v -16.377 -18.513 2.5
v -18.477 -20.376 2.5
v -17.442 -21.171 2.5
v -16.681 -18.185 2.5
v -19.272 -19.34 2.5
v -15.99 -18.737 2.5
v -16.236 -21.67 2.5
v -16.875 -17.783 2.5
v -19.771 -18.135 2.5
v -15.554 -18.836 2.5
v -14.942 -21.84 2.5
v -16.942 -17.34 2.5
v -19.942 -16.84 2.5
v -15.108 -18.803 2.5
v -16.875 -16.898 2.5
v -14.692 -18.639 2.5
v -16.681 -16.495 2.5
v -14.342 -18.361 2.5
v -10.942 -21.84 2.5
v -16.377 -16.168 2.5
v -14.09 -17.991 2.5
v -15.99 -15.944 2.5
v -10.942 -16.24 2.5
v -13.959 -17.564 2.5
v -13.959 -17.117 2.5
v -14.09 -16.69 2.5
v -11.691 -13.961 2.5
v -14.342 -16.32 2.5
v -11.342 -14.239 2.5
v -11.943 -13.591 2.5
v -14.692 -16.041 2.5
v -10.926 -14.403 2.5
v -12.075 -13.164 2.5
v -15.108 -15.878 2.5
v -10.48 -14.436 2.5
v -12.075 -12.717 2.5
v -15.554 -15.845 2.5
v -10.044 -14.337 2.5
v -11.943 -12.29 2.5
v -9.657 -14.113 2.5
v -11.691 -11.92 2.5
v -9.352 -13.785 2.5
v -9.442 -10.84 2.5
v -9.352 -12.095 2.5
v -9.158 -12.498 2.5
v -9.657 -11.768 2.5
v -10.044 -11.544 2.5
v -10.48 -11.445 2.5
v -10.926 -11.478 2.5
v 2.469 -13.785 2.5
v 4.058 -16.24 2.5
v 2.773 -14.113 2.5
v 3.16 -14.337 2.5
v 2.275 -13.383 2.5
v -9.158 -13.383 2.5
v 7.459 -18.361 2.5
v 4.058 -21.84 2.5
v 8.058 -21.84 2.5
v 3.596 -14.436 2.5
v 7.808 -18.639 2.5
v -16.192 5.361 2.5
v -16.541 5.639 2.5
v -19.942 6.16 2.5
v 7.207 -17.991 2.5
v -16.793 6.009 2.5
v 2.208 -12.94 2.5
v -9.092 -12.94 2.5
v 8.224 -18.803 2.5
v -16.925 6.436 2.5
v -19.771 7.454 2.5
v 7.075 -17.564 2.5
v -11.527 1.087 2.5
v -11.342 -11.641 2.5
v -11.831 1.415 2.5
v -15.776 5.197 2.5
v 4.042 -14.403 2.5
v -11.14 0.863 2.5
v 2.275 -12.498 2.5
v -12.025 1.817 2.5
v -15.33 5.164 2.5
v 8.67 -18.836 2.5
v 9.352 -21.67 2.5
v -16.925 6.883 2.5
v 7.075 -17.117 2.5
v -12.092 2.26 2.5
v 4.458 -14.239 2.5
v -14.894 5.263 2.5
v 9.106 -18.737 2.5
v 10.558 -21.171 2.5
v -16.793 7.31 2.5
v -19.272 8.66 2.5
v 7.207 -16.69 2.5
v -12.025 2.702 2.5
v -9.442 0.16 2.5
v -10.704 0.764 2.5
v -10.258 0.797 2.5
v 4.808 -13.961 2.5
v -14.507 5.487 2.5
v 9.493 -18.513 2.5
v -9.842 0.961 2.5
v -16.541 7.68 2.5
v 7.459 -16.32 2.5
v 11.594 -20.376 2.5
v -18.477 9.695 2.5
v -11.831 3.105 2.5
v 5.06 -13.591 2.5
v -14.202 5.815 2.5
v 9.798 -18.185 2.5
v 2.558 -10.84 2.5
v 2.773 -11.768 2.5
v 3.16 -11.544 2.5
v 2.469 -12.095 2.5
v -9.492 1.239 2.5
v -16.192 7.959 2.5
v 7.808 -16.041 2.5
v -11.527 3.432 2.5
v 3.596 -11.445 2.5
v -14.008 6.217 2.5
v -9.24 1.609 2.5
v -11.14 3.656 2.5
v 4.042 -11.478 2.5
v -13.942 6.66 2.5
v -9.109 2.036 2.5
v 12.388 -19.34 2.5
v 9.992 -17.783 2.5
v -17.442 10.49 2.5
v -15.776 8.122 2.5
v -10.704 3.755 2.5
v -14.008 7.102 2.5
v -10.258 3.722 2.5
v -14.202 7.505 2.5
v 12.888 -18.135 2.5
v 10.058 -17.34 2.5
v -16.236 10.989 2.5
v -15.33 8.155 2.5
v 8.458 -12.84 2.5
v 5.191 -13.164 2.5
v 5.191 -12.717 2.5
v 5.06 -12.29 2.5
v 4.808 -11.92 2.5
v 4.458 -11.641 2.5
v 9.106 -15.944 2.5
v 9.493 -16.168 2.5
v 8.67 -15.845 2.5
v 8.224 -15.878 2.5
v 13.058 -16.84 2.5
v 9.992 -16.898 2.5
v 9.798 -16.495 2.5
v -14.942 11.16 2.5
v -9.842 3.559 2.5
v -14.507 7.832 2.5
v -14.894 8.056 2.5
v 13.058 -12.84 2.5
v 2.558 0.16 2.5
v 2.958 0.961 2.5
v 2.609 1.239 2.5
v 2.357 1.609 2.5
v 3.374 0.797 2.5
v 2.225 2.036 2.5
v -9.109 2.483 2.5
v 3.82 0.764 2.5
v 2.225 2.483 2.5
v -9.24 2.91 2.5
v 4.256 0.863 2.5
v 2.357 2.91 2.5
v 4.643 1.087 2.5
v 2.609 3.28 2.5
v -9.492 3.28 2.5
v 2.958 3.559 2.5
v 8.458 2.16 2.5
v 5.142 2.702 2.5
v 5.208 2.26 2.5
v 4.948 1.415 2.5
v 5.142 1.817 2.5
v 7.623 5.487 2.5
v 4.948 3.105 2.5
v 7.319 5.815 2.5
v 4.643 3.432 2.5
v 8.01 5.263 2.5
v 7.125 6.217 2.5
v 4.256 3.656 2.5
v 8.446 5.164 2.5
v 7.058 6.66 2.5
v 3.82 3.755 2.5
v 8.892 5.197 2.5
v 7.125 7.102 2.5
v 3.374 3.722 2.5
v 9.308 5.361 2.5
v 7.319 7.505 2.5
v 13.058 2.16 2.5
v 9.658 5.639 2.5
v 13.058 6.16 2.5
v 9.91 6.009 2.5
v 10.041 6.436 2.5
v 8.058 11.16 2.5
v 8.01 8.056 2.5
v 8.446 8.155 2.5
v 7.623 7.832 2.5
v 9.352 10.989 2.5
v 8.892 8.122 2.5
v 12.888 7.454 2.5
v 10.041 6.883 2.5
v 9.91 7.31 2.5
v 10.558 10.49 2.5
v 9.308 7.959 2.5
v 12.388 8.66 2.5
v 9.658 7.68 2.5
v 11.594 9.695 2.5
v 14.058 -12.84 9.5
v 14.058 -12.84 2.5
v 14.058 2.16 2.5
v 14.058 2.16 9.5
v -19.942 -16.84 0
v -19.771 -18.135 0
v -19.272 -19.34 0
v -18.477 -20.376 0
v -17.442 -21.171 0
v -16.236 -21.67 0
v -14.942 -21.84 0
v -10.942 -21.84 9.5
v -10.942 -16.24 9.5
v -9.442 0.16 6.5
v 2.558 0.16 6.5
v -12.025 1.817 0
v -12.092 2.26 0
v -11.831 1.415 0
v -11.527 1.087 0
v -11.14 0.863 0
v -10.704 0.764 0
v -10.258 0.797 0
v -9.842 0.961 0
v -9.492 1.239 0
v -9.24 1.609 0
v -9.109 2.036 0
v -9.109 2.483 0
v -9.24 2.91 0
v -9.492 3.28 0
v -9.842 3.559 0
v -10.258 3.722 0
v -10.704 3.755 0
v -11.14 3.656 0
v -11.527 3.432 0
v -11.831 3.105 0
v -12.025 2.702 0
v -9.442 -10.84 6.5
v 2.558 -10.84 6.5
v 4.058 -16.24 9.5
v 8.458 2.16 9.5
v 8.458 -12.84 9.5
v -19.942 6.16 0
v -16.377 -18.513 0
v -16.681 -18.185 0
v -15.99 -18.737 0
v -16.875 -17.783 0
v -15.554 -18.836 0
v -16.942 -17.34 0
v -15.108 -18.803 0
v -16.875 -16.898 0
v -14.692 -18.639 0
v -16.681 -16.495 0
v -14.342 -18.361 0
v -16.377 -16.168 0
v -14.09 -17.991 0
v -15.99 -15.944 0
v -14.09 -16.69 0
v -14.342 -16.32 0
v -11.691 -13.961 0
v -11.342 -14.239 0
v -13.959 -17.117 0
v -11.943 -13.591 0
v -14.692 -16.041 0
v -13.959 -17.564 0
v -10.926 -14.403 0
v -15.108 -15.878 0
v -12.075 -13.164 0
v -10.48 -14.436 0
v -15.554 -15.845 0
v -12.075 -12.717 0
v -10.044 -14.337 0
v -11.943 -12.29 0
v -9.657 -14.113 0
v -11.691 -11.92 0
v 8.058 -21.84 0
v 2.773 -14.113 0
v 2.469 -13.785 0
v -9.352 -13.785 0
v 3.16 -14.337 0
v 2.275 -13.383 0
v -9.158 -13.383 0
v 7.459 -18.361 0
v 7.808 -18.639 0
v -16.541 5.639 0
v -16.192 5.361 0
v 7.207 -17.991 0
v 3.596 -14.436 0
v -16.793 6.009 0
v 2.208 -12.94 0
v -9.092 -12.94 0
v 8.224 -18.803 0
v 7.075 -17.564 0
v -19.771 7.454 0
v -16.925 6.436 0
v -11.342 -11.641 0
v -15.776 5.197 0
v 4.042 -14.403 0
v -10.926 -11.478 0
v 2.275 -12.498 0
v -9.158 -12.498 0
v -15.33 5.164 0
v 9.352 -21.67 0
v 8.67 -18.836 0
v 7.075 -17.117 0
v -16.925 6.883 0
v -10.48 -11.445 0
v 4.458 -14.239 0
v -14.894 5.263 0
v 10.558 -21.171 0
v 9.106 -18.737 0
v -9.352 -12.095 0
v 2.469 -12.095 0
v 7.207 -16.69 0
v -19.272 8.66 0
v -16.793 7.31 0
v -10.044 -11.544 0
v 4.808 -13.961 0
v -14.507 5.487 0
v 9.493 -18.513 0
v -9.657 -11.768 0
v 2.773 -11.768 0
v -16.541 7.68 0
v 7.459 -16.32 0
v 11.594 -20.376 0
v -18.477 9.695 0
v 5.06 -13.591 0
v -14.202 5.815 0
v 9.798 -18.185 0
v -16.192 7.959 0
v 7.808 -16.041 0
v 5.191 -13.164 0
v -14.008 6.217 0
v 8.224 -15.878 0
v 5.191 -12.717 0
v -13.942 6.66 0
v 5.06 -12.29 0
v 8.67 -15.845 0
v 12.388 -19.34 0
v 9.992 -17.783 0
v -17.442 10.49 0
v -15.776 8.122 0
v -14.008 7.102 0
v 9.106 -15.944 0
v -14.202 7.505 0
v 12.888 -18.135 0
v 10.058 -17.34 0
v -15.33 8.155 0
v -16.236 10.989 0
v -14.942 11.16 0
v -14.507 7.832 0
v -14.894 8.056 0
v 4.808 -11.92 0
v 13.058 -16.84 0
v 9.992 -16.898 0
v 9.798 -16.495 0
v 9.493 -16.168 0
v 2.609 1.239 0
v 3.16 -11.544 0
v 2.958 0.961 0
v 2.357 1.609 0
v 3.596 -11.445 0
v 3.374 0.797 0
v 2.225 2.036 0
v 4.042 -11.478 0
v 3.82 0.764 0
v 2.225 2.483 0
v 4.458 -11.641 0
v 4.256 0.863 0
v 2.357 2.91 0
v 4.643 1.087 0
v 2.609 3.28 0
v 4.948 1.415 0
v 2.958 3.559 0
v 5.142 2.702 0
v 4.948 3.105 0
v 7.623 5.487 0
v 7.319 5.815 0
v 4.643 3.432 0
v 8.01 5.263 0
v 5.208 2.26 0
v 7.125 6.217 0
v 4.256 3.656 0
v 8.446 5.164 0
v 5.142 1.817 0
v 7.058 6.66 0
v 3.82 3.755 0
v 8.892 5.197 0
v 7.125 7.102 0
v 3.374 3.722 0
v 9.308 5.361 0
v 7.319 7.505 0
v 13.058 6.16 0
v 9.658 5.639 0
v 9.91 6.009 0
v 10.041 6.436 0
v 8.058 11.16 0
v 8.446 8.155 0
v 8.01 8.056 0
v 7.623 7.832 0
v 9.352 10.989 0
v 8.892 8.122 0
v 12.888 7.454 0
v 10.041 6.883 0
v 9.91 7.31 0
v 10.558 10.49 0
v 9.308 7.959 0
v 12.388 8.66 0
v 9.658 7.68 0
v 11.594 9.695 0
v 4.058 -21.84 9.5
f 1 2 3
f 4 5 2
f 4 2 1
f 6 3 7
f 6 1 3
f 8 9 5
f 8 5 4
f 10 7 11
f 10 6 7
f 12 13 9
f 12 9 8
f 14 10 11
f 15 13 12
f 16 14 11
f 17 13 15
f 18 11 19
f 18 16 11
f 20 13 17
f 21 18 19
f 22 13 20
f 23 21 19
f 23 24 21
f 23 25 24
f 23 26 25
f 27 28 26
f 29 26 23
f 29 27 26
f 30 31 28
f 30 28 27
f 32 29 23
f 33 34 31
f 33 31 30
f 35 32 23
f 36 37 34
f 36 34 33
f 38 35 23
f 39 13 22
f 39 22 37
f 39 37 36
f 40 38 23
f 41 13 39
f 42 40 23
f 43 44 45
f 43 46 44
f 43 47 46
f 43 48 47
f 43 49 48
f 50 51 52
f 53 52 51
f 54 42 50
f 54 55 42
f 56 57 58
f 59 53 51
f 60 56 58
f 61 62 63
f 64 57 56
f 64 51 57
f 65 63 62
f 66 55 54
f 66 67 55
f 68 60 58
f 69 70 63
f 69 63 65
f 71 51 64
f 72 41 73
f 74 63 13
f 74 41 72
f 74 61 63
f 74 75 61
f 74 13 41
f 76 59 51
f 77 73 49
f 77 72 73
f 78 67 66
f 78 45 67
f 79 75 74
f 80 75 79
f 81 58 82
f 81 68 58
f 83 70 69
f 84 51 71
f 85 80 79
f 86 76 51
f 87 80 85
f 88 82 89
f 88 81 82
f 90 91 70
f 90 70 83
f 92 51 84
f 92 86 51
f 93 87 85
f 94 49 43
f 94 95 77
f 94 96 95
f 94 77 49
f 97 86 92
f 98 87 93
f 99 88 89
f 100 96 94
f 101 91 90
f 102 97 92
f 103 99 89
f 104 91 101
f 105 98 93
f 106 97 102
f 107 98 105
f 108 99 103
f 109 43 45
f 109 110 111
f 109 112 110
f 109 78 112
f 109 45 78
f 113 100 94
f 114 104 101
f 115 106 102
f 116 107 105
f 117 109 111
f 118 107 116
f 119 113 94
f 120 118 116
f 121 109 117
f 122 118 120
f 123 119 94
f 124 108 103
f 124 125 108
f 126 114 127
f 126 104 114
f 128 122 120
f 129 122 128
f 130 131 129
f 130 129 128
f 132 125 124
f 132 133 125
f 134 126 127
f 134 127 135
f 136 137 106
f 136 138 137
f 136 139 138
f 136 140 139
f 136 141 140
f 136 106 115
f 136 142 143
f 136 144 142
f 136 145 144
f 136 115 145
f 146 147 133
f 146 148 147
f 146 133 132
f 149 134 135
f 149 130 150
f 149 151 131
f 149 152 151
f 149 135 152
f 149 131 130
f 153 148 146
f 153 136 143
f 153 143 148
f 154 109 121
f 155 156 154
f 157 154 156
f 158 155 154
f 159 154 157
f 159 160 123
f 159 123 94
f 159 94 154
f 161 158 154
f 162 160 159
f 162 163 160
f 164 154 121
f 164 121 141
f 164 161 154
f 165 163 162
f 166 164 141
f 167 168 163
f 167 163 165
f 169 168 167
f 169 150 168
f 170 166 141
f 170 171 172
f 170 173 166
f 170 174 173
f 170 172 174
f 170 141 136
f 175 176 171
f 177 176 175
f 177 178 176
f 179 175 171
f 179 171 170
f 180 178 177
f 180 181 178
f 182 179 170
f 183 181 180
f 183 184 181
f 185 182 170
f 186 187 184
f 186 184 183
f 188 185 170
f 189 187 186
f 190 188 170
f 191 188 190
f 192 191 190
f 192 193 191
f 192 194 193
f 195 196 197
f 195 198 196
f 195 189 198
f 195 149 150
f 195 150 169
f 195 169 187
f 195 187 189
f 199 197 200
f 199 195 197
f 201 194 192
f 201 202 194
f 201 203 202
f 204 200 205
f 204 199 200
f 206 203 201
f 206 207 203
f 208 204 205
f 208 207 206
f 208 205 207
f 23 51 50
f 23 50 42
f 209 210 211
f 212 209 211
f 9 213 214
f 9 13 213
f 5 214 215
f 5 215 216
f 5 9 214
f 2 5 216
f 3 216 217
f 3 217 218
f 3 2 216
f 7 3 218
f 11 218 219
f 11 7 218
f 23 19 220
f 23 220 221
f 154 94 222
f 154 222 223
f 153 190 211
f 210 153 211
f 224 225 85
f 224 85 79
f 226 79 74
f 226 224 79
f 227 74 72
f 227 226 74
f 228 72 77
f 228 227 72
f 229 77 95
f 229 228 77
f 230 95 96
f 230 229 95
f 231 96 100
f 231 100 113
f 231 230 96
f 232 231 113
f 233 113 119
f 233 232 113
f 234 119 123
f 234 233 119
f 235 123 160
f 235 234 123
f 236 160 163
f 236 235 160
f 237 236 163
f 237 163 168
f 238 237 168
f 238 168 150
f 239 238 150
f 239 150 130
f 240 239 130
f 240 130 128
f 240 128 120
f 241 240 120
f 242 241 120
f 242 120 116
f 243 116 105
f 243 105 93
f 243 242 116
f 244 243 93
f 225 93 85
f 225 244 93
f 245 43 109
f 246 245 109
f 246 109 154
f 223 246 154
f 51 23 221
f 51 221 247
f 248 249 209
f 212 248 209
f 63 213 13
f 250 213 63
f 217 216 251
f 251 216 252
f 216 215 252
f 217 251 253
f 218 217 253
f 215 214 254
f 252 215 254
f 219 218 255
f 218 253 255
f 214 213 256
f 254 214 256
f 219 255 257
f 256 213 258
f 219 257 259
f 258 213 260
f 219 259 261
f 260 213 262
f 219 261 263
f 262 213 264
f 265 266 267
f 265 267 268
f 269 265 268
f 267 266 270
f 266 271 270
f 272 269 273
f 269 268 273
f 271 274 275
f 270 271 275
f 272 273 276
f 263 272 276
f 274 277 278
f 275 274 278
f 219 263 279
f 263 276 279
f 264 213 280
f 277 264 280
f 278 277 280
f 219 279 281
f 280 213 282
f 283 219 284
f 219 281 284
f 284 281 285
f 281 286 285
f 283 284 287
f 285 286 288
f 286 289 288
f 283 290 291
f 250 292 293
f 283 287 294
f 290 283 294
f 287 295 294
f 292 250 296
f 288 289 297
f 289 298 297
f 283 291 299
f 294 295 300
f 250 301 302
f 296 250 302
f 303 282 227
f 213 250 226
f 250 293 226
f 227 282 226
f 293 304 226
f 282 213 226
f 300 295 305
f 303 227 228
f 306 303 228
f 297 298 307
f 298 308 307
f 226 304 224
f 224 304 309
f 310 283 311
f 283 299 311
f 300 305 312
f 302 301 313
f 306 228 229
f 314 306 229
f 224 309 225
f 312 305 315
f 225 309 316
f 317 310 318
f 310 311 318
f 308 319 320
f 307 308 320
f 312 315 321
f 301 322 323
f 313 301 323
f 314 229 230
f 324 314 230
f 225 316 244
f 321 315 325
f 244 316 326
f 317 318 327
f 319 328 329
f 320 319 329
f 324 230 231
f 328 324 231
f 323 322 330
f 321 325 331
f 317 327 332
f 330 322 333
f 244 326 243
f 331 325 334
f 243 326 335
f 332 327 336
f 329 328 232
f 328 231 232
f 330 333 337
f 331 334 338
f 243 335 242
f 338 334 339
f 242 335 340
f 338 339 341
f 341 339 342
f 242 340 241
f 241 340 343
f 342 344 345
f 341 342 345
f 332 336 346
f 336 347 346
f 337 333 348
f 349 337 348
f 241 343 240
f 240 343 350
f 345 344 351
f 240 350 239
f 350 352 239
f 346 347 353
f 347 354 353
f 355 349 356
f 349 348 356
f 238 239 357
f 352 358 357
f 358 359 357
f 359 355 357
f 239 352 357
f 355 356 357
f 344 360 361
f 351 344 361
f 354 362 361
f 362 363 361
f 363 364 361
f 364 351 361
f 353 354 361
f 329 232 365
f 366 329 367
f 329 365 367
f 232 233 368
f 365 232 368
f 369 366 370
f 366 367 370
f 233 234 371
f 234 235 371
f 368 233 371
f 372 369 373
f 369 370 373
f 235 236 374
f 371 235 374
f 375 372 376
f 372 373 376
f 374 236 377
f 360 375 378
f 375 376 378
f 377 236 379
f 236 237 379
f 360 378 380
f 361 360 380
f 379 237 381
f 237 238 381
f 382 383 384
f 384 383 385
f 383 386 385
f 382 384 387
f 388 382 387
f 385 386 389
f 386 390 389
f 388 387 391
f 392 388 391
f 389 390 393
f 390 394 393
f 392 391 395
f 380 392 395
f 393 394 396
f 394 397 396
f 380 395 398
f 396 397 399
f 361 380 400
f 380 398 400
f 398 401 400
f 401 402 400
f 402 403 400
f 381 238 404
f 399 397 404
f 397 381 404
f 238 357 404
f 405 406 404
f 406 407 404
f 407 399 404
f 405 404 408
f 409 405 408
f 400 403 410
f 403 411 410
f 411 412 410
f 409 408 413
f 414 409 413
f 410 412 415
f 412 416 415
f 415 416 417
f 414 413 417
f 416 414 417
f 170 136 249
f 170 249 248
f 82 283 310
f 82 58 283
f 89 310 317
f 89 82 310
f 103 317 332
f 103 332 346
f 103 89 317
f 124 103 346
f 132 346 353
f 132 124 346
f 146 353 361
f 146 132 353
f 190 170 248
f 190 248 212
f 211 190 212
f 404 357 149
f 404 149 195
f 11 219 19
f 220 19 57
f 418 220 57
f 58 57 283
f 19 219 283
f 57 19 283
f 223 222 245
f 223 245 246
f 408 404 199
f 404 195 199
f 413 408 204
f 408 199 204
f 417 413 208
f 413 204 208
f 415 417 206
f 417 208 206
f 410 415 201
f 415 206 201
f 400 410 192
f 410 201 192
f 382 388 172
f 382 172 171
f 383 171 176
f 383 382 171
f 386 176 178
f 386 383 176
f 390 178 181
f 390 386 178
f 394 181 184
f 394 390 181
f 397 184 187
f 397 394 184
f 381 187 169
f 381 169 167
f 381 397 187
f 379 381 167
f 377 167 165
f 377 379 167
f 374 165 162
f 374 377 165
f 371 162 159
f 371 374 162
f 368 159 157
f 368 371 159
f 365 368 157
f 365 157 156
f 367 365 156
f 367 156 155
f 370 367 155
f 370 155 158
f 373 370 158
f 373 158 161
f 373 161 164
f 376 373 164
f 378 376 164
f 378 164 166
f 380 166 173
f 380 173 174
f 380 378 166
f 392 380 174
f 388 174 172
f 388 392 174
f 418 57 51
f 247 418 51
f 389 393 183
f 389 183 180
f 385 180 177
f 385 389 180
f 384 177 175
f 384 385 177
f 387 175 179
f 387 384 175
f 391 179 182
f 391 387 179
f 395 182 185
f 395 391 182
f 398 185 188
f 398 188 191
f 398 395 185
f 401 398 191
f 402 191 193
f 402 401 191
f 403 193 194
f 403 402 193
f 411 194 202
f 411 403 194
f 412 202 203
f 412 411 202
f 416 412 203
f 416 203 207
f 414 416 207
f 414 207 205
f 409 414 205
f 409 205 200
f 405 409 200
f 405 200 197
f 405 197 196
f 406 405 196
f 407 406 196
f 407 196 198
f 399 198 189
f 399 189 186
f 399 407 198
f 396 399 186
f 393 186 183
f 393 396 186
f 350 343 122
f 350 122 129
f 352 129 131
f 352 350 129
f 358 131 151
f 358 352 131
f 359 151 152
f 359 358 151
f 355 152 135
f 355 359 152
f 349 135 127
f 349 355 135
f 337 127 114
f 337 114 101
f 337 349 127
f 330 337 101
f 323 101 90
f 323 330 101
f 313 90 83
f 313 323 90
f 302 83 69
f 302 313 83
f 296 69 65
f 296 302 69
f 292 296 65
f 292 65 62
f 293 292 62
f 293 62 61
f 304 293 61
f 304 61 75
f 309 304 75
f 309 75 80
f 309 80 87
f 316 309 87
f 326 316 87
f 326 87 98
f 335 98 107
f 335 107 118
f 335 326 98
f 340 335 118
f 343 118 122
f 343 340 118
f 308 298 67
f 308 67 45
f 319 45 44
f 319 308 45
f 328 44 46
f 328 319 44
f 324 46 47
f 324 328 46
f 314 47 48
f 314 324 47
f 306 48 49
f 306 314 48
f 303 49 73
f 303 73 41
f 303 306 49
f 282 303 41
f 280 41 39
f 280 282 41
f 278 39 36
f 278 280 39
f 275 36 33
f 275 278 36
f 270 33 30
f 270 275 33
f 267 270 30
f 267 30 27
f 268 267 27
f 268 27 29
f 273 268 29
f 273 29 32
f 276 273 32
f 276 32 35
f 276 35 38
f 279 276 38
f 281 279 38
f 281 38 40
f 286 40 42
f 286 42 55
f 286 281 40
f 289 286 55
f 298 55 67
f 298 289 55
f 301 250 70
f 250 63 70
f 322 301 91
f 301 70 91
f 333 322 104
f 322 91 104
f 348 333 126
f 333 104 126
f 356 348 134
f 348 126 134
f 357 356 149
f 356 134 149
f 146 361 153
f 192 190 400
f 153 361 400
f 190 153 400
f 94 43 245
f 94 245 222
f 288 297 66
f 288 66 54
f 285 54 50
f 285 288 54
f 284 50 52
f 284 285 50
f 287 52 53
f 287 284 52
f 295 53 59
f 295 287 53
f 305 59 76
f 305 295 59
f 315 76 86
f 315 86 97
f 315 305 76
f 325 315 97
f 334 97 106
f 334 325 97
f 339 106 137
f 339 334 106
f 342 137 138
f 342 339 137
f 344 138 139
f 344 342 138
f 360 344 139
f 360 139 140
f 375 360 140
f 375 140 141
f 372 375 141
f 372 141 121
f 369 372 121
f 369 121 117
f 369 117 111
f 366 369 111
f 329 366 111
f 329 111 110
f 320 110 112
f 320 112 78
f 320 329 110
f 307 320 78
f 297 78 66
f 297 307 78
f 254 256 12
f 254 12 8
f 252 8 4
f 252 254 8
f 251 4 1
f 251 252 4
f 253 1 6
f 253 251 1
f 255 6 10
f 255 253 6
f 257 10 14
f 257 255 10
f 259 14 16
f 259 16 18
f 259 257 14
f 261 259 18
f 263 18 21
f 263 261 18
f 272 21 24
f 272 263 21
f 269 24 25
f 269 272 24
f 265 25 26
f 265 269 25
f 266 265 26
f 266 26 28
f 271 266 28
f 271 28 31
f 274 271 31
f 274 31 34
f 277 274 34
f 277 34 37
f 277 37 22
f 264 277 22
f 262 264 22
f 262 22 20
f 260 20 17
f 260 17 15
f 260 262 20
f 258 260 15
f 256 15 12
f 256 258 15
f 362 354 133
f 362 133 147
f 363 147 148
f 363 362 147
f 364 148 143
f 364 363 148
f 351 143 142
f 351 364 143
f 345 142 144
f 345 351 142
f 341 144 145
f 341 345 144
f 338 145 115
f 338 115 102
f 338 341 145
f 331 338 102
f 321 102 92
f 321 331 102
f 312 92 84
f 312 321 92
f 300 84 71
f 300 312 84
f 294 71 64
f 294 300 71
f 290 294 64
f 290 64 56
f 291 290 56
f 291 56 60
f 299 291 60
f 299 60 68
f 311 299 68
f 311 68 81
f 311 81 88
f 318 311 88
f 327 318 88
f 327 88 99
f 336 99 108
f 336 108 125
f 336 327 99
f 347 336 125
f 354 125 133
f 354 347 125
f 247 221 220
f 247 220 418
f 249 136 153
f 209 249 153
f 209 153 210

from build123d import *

# Parameters (mm, degrees)
SKETCH1_W           = 33
SKETCH1_H           = 33
SKETCH1_R           = 1.5
BOSS_EXTRUDE1_DEPTH = 2.5
FILLET1_R           = 5
SKETCH2_W           = 15
SKETCH2_H           = 5.6
SKETCH2_W_2         = 5.6
SKETCH2_H_2         = 15
BOSS_EXTRUDE2_DEPTH = 7
SKETCH3_W           = 12
SKETCH3_H           = 11
BOSS_EXTRUDE3_DEPTH = 4


with BuildPart() as part:
    # Sketch1 → Boss-Extrude1 (new body)
    with BuildSketch(Plane.XY):
        with Locations((-3.4417913, -5.340458015)):
            Rectangle(SKETCH1_W, SKETCH1_H)
        with Locations((-15.4417913, 6.659541985)):
            Circle(SKETCH1_R, mode=Mode.SUBTRACT)
        with Locations(Location((8.5582087, 6.659541985, 0), (0, 0, 180))):
            Circle(SKETCH1_R, mode=Mode.SUBTRACT)
        with Locations(Location((-15.4417913, -17.340458015, 0), (0, 0, 180))):
            Circle(SKETCH1_R, mode=Mode.SUBTRACT)
        with Locations((8.5582087, -17.340458015)):
            Circle(SKETCH1_R, mode=Mode.SUBTRACT)
        with Locations((-10.5917913, -12.940458015)):
            Circle(SKETCH1_R, mode=Mode.SUBTRACT)
        with Locations(Location((3.7082087, -12.940458015, 0), (0, 0, 180))):
            Circle(SKETCH1_R, mode=Mode.SUBTRACT)
        with Locations(Location((-10.5917913, 2.259541985, 0), (0, 0, 180))):
            Circle(SKETCH1_R, mode=Mode.SUBTRACT)
        with Locations((3.7082087, 2.259541985)):
            Circle(SKETCH1_R, mode=Mode.SUBTRACT)
    extrude(amount=BOSS_EXTRUDE1_DEPTH)

    # Fillet1
    fillet1_edges = [part.edges().sort_by_distance(p)[0] for p in [
        (-19.9417913, 11.159541985, 1.25),
        (13.0582087, 11.159541985, 1.25),
        (13.0582087, -21.840458015, 1.25),
        (-19.9417913, -21.840458015, 1.25),
    ]]
    fillet(fillet1_edges, radius=FILLET1_R)

    # Sketch2 → Boss-Extrude2 (add)
    with BuildSketch(Plane.XY.offset(2.5)):
        with Locations((-3.4417913, -19.040458015)):
            Rectangle(SKETCH2_W, SKETCH2_H)
        with Locations((11.2582087, -5.340458015)):
            Rectangle(SKETCH2_W_2, SKETCH2_H_2)
    extrude(amount=BOSS_EXTRUDE2_DEPTH)

    # Sketch3 → Boss-Extrude3 (add)
    with BuildSketch(Plane.XY.offset(2.5)):
        with Locations((-3.4417913, -5.340458015)):
            Rectangle(SKETCH3_W, SKETCH3_H)
    extrude(amount=BOSS_EXTRUDE3_DEPTH)


solid = part.part
